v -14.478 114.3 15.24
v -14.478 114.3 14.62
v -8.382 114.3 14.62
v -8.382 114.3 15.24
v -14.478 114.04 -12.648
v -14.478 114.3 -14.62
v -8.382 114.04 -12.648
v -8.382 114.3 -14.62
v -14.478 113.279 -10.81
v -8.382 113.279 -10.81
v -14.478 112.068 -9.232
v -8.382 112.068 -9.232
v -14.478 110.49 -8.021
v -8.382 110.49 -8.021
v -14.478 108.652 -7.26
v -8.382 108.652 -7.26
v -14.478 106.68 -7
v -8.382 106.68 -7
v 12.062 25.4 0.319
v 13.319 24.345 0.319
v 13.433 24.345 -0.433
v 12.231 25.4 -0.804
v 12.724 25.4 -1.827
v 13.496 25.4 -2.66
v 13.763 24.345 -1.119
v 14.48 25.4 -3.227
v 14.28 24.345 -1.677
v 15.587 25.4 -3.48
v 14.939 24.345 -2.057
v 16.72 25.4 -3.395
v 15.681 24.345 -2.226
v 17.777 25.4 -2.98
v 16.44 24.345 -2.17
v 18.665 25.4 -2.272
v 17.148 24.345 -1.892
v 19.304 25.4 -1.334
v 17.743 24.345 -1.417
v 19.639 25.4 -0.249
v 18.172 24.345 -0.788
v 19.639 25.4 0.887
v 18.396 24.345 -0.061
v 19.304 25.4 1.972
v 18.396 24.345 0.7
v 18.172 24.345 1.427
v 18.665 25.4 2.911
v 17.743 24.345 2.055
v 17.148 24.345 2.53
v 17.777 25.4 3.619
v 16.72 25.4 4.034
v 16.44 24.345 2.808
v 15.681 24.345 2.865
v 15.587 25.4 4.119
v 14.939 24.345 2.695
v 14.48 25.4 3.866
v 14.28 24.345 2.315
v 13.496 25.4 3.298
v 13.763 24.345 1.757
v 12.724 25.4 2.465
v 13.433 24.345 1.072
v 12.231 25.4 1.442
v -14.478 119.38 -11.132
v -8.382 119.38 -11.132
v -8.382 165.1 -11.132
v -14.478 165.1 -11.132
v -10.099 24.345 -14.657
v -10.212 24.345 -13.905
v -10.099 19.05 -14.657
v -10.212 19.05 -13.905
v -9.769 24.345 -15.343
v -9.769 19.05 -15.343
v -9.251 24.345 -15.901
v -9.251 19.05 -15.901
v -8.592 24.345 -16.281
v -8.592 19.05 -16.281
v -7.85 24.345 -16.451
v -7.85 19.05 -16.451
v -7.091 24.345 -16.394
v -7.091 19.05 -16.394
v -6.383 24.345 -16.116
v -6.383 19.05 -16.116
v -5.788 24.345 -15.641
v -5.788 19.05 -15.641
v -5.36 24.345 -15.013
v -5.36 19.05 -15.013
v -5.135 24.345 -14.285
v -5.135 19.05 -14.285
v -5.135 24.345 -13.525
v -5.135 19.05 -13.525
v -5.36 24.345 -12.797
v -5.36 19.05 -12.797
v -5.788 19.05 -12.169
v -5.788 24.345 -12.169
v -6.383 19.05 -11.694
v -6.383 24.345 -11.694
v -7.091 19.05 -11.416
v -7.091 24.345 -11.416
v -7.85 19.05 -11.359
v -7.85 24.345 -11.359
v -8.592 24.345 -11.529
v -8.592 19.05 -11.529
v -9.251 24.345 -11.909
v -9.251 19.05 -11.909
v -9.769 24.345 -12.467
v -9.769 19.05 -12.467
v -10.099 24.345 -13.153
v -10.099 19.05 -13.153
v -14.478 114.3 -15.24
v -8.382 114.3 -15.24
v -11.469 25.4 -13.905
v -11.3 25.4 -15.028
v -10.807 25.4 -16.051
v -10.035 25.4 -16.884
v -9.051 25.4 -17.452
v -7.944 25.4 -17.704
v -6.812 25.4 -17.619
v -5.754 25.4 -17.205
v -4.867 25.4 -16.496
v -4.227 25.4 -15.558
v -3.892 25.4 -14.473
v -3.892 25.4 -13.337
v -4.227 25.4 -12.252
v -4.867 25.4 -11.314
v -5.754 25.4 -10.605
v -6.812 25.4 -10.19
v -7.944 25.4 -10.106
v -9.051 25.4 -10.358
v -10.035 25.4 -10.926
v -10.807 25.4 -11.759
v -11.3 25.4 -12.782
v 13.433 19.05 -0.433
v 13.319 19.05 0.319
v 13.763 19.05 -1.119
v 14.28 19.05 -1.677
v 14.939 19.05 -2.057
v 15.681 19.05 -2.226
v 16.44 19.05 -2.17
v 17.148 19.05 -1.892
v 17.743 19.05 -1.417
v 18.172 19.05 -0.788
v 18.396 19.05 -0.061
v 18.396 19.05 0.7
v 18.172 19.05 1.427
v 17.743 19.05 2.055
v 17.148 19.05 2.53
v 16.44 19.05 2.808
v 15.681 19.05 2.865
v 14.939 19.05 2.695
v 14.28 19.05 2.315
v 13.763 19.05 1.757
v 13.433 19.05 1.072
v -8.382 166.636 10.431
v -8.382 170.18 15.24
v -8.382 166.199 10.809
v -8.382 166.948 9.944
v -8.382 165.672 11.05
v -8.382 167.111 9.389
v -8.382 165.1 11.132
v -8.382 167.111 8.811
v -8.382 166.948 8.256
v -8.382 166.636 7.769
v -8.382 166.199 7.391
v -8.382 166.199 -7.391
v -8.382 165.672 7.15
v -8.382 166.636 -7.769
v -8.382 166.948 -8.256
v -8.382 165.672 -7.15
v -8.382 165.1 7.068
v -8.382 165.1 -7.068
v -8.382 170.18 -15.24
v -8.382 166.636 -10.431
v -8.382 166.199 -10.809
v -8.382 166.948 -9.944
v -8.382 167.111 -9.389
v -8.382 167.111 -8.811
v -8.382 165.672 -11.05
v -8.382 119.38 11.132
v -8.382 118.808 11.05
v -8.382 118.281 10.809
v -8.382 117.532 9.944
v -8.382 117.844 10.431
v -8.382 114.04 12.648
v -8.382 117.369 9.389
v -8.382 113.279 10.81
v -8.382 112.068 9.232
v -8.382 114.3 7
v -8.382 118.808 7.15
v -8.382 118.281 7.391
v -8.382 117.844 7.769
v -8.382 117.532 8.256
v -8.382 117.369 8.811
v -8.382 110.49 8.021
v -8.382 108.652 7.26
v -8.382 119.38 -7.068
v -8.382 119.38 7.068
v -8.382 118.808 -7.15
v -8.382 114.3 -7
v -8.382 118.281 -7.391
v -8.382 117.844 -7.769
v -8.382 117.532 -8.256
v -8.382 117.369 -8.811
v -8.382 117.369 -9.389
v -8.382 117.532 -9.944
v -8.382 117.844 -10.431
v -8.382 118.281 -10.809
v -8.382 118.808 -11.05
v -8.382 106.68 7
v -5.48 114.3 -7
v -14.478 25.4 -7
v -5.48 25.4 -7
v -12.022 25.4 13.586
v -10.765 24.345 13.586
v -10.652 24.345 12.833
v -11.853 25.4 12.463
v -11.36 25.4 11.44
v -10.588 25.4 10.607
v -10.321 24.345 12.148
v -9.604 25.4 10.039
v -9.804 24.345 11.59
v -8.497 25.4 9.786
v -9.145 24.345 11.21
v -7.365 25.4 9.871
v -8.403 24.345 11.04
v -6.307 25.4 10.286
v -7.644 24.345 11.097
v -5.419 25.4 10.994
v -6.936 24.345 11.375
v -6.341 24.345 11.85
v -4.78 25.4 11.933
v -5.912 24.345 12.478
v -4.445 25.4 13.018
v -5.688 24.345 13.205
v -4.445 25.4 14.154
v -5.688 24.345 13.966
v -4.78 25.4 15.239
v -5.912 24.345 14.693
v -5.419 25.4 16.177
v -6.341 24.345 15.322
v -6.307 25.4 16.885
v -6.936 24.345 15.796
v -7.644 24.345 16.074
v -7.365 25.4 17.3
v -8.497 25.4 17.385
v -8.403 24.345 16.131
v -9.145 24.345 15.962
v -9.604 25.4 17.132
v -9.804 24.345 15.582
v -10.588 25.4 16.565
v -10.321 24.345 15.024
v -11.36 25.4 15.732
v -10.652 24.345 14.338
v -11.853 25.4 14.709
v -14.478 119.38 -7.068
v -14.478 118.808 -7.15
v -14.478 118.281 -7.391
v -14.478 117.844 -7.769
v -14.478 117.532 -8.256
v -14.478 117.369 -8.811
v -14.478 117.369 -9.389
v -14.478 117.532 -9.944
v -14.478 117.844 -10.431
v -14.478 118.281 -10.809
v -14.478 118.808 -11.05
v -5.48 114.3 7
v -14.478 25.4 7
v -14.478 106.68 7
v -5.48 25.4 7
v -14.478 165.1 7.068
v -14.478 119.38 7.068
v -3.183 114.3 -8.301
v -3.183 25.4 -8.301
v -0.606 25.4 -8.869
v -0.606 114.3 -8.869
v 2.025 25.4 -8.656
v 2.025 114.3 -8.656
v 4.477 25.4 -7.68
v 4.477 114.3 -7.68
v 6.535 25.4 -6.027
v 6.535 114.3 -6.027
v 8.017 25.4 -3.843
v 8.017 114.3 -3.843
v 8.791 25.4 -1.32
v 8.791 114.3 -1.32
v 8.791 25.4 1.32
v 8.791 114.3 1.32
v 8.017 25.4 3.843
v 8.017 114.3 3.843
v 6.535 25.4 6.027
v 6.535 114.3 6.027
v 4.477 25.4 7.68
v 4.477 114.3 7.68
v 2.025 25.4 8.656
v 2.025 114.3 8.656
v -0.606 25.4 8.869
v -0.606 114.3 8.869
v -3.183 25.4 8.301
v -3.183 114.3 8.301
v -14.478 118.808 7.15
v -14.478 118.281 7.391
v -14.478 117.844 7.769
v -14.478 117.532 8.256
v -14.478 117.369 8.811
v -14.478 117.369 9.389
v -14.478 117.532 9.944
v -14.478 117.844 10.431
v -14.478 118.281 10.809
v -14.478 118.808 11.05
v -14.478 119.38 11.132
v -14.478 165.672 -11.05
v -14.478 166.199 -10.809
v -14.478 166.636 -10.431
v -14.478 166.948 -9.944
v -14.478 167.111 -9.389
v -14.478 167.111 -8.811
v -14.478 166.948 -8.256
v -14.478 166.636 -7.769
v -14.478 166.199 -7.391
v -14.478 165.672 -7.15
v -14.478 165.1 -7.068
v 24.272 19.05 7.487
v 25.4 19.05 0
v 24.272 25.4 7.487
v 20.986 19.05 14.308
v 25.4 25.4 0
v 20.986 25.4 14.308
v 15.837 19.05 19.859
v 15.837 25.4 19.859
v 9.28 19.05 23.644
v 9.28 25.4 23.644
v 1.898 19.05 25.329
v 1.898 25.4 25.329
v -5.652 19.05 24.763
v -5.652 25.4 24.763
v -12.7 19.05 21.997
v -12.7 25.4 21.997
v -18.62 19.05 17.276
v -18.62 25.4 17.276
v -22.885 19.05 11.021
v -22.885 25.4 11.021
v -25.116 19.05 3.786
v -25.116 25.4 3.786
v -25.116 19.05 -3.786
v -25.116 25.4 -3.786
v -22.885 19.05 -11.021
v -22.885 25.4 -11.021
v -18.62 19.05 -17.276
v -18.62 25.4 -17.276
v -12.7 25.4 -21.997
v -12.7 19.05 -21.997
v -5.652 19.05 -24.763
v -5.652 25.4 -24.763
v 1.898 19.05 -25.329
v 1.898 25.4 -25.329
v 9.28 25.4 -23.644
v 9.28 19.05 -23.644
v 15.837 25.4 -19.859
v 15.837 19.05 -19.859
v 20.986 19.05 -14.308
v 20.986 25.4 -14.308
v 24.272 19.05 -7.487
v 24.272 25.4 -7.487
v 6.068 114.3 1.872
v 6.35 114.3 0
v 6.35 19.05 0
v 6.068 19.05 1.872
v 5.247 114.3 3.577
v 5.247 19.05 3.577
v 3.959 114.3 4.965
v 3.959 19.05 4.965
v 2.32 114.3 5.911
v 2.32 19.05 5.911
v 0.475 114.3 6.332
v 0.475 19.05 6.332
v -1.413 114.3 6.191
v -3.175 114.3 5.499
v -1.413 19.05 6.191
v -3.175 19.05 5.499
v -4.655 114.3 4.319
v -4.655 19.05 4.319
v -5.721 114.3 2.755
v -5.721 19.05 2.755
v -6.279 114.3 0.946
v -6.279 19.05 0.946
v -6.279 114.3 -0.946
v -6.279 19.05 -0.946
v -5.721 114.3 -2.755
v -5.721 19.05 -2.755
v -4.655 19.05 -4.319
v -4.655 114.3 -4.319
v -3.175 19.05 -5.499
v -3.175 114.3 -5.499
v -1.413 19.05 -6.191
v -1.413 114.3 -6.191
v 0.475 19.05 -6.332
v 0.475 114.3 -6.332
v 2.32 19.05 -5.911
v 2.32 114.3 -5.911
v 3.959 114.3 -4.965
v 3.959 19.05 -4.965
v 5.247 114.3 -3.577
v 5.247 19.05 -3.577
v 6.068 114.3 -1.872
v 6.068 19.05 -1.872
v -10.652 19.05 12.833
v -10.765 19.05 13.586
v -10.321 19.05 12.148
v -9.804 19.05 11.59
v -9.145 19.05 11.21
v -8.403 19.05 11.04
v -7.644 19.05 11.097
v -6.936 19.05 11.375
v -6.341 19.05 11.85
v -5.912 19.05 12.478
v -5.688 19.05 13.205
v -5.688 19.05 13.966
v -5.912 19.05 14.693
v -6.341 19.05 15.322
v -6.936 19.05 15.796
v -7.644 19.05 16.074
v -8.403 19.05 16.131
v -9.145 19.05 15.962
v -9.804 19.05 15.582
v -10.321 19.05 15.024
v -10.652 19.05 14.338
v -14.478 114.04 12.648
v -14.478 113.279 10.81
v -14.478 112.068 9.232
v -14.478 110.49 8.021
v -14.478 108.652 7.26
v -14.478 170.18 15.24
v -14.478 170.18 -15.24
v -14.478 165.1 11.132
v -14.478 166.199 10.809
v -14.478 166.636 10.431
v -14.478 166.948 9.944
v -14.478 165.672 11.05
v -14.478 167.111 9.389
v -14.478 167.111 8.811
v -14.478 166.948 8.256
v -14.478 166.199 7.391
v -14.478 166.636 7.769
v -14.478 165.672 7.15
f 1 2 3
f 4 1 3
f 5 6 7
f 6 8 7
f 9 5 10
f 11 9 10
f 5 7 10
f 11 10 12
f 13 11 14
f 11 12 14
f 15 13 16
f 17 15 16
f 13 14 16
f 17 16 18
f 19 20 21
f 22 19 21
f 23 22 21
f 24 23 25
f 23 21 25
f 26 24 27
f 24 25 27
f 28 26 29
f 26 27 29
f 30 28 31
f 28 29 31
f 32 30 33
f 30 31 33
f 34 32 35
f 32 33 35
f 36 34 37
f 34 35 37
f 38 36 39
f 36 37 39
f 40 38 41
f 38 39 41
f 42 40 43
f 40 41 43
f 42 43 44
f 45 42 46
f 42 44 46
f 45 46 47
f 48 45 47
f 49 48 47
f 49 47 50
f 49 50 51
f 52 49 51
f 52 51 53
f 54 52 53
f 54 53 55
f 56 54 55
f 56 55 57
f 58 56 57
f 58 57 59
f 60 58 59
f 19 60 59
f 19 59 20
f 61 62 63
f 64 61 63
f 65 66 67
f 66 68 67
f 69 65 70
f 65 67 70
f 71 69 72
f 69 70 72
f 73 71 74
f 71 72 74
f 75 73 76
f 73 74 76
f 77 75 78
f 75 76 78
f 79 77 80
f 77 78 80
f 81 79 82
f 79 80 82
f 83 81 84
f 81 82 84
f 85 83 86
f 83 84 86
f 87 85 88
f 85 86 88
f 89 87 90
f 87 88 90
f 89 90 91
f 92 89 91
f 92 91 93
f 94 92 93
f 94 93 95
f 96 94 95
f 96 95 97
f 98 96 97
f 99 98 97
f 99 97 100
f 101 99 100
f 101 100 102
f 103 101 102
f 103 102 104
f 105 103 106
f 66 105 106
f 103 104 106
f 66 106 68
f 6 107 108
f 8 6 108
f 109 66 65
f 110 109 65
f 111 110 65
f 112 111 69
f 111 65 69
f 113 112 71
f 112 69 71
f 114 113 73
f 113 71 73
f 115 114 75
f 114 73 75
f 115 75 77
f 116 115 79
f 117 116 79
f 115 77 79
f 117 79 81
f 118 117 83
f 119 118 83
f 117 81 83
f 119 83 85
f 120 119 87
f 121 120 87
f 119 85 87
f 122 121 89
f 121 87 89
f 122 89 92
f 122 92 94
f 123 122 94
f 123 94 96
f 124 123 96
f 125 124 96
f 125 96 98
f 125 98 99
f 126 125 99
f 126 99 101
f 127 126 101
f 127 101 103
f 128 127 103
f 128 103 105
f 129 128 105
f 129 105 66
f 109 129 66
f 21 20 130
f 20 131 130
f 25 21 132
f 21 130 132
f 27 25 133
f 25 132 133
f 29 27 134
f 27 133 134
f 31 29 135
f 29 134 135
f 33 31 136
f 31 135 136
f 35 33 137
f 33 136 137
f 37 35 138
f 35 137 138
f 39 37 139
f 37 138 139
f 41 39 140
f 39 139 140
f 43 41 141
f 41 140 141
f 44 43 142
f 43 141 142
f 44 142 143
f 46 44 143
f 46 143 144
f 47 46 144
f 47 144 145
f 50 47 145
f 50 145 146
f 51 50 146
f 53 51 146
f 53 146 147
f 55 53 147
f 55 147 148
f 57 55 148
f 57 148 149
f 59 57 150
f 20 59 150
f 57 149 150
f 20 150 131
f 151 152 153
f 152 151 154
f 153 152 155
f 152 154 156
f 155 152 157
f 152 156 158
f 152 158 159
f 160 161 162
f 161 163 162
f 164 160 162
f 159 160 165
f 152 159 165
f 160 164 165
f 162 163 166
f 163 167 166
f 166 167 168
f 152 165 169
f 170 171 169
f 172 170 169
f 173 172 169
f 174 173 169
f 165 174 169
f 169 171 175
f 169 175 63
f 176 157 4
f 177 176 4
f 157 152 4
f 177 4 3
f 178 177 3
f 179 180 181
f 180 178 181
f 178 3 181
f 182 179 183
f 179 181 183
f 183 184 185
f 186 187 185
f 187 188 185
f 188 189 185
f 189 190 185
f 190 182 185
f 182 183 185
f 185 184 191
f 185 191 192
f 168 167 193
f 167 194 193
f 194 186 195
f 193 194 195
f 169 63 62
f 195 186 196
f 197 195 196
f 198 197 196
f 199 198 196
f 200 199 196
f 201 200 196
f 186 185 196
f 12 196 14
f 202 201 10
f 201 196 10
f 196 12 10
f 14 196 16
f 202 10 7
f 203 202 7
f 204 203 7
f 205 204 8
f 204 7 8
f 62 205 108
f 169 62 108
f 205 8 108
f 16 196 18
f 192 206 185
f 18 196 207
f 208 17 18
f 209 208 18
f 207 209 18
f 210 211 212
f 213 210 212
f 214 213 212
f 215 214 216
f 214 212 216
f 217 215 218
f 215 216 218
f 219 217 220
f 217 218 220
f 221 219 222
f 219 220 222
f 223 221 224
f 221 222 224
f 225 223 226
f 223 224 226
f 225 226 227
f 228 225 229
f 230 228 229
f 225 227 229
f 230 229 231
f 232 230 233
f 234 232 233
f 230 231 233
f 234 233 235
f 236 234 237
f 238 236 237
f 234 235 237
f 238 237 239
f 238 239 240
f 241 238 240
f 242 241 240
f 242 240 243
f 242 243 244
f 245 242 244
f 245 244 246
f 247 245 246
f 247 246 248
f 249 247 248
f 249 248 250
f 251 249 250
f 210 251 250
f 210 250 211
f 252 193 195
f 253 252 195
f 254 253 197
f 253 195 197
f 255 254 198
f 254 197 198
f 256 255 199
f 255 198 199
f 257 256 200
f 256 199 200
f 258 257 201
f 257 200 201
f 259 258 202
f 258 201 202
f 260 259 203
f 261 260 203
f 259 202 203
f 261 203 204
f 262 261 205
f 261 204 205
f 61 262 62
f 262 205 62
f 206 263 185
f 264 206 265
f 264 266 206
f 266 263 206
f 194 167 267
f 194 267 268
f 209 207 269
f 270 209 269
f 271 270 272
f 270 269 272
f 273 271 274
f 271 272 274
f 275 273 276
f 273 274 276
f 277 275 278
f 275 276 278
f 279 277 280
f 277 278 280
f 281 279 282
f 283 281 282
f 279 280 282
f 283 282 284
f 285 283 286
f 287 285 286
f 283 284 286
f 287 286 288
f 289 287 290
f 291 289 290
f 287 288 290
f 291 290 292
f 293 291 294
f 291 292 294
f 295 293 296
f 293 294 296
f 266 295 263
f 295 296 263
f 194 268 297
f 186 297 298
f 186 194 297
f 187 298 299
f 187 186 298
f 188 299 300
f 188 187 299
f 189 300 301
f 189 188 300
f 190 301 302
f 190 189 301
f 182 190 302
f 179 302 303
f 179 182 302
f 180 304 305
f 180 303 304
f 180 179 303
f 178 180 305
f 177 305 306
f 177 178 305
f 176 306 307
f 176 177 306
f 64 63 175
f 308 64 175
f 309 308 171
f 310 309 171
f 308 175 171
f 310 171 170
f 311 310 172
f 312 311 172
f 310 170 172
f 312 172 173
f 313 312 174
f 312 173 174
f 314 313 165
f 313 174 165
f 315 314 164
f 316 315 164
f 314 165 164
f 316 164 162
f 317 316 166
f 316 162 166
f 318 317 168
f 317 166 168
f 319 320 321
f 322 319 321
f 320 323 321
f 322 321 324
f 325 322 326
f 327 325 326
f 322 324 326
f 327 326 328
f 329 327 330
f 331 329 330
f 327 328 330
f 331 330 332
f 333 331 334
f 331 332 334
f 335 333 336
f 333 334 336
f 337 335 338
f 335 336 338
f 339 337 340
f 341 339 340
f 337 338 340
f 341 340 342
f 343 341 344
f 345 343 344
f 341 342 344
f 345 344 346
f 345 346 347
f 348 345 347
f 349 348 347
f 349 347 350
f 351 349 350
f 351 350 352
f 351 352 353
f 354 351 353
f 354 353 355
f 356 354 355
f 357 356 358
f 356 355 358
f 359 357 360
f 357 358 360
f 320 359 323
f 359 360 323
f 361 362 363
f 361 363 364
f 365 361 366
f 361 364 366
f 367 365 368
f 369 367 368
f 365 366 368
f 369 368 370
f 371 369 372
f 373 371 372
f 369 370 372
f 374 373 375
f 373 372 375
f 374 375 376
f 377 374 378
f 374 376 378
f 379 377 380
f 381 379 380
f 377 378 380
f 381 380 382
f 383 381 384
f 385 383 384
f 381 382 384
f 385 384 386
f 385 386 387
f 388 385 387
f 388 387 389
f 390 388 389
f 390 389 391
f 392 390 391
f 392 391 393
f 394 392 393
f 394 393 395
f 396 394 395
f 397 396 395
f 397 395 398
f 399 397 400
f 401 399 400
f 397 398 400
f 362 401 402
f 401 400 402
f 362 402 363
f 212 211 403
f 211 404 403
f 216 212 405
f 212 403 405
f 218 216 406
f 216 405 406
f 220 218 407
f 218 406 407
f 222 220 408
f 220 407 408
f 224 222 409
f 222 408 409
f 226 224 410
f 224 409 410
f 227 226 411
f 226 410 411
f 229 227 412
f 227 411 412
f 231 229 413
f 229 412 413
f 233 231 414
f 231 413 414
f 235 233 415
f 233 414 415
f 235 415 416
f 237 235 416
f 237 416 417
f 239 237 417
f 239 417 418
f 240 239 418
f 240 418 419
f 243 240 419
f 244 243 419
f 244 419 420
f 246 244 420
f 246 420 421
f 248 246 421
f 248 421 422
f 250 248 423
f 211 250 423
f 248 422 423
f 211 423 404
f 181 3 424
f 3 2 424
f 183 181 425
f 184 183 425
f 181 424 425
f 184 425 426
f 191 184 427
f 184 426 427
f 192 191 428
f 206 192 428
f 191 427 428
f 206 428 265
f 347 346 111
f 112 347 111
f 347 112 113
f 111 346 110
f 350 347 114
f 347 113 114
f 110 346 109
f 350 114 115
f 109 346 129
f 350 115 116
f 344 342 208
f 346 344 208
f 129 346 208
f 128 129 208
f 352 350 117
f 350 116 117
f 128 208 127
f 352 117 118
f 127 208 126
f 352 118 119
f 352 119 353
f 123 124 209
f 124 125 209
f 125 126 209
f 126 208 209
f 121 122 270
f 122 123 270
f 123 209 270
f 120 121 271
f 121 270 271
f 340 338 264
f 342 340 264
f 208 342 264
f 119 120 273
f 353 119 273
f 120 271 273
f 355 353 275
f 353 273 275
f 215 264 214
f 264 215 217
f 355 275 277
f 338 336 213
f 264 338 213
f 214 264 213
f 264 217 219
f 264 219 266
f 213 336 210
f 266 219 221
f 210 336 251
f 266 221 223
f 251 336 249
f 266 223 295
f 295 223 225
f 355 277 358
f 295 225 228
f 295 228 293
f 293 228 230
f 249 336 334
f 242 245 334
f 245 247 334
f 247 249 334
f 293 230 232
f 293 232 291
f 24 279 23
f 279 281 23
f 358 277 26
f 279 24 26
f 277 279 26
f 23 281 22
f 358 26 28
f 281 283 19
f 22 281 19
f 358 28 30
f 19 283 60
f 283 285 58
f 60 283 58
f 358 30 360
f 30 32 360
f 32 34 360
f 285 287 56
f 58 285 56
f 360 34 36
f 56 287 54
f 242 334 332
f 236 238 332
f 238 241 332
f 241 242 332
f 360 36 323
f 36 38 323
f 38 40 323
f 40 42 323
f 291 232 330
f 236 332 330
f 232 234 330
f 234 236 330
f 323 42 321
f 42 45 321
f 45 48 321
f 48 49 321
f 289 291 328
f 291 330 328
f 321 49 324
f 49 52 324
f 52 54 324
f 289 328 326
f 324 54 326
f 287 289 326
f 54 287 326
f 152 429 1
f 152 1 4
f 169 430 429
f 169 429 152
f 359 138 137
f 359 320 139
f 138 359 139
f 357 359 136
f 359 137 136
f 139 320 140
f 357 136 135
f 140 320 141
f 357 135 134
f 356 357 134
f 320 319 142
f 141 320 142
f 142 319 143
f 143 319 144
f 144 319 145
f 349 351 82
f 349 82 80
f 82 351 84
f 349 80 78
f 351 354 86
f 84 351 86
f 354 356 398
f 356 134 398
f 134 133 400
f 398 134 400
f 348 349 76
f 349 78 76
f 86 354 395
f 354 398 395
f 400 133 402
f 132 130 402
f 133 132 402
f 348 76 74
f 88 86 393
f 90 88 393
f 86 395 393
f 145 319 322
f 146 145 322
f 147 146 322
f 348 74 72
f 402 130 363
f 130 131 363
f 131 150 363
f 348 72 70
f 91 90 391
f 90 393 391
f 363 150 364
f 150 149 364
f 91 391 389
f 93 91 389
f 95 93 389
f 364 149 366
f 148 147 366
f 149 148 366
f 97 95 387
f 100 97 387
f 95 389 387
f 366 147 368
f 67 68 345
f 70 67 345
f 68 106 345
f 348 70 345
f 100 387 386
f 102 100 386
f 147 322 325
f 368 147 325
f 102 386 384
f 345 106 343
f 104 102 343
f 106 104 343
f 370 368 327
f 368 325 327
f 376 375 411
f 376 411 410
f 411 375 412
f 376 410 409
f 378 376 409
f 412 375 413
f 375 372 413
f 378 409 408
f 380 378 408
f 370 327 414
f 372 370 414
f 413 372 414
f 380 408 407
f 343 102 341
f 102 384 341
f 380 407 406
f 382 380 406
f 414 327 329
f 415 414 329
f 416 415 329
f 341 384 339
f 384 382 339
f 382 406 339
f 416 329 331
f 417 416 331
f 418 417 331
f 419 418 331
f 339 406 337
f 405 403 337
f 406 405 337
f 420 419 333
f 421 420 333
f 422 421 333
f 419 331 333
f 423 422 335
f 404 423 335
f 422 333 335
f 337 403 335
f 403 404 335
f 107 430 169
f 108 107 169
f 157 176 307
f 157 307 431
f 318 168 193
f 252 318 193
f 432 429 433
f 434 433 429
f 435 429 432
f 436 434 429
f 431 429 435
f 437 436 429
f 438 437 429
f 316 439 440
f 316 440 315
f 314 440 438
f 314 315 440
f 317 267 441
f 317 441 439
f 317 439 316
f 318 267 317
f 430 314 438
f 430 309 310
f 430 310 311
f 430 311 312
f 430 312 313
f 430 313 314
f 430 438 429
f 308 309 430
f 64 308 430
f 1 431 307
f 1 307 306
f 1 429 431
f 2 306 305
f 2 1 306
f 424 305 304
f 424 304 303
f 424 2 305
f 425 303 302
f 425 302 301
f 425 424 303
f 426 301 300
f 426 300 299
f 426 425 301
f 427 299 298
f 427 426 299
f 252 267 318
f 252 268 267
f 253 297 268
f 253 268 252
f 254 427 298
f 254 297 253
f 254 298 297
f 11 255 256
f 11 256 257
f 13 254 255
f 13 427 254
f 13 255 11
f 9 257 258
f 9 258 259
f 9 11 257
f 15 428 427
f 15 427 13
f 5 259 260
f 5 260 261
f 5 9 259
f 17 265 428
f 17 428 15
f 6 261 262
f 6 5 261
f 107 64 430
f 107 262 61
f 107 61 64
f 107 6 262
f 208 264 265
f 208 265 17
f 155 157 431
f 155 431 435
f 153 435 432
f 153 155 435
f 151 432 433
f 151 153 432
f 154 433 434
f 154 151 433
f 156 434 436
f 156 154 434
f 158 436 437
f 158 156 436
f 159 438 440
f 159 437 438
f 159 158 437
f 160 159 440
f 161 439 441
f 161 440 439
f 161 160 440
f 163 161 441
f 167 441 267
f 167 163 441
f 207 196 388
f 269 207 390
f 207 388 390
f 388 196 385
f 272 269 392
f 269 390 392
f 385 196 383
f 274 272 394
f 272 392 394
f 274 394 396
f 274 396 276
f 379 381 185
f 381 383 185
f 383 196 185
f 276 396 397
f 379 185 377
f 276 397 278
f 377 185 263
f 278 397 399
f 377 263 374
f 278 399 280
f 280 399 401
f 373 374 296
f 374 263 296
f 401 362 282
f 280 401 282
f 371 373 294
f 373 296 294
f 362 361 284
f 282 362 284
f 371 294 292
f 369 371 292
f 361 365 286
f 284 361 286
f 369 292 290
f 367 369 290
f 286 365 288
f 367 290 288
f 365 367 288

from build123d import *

# Parameters (mm, degrees)
F_1_4_20_TAPPED_HOLE1_D           = 5.1054
F_1_4_20_TAPPED_HOLE1_CSINK_D     = 7.62
F_1_4_20_TAPPED_HOLE1_CSINK_ANGLE = 100
BOSS_EXTRUDE1_DEPTH               = 88.9
SKETCH13_W                        = 6.096
SKETCH13_H                        = 30.48
BOSS_EXTRUDE2_DEPTH               = 55.88
CUT_EXTRUDE1_REACH                = 19.018
FILLET1_R                         = 7.62


with BuildPart() as part:
    # Sketch1 → Revolve1 (revolve)
    with BuildSketch(Plane.XY):
        Polygon((6.35, 19.05), (25.4, 19.05), (25.4, 25.4), (8.89, 25.4), (8.89, 114.3), (6.35, 114.3), align=None)
    revolve(axis=Axis((0, 131.17698584, 0), (0, -1, 0)))

    # 1/4-20 Tapped Hole1 (through all)
    with Locations(Plane(origin=(0, 25.4, 0), x_dir=(1, 0, 0), z_dir=(0, 1, 0))):
        with Locations((-8.212314406, -13.58578364), (-7.659476559, 13.904964719), (15.871790965, -0.319181079)):
            CounterSinkHole(F_1_4_20_TAPPED_HOLE1_D / 2, F_1_4_20_TAPPED_HOLE1_CSINK_D / 2, counter_sink_angle=F_1_4_20_TAPPED_HOLE1_CSINK_ANGLE)

    # Sketch12 → Boss-Extrude1 (add)
    with BuildSketch(Plane(origin=(0, 25.4, 0), x_dir=(1, 0, 0), z_dir=(0, 1, 0))):
        with BuildLine():
            Line((-5.480155107, -7), (-14.478, -7))
            Line((-14.478, -7), (-14.478, 7))
            Line((-14.478, 7), (-5.480155107, 7))
            ThreePointArc((-5.480155107, 7), (-8.89, 0), (-5.480155107, -7))
        make_face()
    extrude(amount=BOSS_EXTRUDE1_DEPTH)

    # Sketch13 → Boss-Extrude2 (add)
    with BuildSketch(Plane(origin=(0, 114.3, 0), x_dir=(1, 0, 0), z_dir=(0, 1, 0))):
        with Locations((-11.43, 0)):
            Rectangle(SKETCH13_W, SKETCH13_H)
    extrude(amount=BOSS_EXTRUDE2_DEPTH)

    # Sketch15 → Cut-Extrude1 (cut, up to next)
    with BuildSketch(Plane(origin=(-8.382, 0, 0), x_dir=(0, 0, -1), z_dir=(1, 0, 0)), mode=Mode.PRIVATE) as cut_extrude1_sk1:
        with BuildLine():
            Line((-11.132, 119.38), (-11.132, 165.1))
            ThreePointArc((-11.132, 165.1), (-9.1, 167.132), (-7.068, 165.1))
            Line((-7.068, 165.1), (-7.068, 119.38))
            ThreePointArc((-7.068, 119.38), (-9.1, 117.348), (-11.132, 119.38))
        make_face()
    cut_extrude1_tool1 = extrude(cut_extrude1_sk1.sketch, amount=-CUT_EXTRUDE1_REACH, mode=Mode.PRIVATE) & part.part
    add(cut_extrude1_tool1.solids().sort_by_distance((-8.382, 142.24, 9.1))[0], mode=Mode.SUBTRACT)
    # Sketch15 → Cut-Extrude1 (cut, up to next)
    with BuildSketch(Plane(origin=(-8.382, 0, 0), x_dir=(0, 0, -1), z_dir=(1, 0, 0)), mode=Mode.PRIVATE) as cut_extrude1_sk2:
        with BuildLine():
            Line((11.132, 119.38), (11.132, 165.1))
            ThreePointArc((11.132, 165.1), (9.1, 167.132), (7.068, 165.1))
            Line((7.068, 165.1), (7.068, 119.38))
            ThreePointArc((7.068, 119.38), (9.1, 117.348), (11.132, 119.38))
        make_face()
    cut_extrude1_tool2 = extrude(cut_extrude1_sk2.sketch, amount=-CUT_EXTRUDE1_REACH, mode=Mode.PRIVATE) & part.part
    add(cut_extrude1_tool2.solids().sort_by_distance((-8.382, 142.24, -9.1))[0], mode=Mode.SUBTRACT)

    # Fillet1
    fillet1_edges = [part.edges().sort_by_distance(p)[0] for p in [
        (-11.43, 114.3, 7),
        (-11.43, 114.3, -7),
    ]]
    fillet(fillet1_edges, radius=FILLET1_R)


solid = part.part
